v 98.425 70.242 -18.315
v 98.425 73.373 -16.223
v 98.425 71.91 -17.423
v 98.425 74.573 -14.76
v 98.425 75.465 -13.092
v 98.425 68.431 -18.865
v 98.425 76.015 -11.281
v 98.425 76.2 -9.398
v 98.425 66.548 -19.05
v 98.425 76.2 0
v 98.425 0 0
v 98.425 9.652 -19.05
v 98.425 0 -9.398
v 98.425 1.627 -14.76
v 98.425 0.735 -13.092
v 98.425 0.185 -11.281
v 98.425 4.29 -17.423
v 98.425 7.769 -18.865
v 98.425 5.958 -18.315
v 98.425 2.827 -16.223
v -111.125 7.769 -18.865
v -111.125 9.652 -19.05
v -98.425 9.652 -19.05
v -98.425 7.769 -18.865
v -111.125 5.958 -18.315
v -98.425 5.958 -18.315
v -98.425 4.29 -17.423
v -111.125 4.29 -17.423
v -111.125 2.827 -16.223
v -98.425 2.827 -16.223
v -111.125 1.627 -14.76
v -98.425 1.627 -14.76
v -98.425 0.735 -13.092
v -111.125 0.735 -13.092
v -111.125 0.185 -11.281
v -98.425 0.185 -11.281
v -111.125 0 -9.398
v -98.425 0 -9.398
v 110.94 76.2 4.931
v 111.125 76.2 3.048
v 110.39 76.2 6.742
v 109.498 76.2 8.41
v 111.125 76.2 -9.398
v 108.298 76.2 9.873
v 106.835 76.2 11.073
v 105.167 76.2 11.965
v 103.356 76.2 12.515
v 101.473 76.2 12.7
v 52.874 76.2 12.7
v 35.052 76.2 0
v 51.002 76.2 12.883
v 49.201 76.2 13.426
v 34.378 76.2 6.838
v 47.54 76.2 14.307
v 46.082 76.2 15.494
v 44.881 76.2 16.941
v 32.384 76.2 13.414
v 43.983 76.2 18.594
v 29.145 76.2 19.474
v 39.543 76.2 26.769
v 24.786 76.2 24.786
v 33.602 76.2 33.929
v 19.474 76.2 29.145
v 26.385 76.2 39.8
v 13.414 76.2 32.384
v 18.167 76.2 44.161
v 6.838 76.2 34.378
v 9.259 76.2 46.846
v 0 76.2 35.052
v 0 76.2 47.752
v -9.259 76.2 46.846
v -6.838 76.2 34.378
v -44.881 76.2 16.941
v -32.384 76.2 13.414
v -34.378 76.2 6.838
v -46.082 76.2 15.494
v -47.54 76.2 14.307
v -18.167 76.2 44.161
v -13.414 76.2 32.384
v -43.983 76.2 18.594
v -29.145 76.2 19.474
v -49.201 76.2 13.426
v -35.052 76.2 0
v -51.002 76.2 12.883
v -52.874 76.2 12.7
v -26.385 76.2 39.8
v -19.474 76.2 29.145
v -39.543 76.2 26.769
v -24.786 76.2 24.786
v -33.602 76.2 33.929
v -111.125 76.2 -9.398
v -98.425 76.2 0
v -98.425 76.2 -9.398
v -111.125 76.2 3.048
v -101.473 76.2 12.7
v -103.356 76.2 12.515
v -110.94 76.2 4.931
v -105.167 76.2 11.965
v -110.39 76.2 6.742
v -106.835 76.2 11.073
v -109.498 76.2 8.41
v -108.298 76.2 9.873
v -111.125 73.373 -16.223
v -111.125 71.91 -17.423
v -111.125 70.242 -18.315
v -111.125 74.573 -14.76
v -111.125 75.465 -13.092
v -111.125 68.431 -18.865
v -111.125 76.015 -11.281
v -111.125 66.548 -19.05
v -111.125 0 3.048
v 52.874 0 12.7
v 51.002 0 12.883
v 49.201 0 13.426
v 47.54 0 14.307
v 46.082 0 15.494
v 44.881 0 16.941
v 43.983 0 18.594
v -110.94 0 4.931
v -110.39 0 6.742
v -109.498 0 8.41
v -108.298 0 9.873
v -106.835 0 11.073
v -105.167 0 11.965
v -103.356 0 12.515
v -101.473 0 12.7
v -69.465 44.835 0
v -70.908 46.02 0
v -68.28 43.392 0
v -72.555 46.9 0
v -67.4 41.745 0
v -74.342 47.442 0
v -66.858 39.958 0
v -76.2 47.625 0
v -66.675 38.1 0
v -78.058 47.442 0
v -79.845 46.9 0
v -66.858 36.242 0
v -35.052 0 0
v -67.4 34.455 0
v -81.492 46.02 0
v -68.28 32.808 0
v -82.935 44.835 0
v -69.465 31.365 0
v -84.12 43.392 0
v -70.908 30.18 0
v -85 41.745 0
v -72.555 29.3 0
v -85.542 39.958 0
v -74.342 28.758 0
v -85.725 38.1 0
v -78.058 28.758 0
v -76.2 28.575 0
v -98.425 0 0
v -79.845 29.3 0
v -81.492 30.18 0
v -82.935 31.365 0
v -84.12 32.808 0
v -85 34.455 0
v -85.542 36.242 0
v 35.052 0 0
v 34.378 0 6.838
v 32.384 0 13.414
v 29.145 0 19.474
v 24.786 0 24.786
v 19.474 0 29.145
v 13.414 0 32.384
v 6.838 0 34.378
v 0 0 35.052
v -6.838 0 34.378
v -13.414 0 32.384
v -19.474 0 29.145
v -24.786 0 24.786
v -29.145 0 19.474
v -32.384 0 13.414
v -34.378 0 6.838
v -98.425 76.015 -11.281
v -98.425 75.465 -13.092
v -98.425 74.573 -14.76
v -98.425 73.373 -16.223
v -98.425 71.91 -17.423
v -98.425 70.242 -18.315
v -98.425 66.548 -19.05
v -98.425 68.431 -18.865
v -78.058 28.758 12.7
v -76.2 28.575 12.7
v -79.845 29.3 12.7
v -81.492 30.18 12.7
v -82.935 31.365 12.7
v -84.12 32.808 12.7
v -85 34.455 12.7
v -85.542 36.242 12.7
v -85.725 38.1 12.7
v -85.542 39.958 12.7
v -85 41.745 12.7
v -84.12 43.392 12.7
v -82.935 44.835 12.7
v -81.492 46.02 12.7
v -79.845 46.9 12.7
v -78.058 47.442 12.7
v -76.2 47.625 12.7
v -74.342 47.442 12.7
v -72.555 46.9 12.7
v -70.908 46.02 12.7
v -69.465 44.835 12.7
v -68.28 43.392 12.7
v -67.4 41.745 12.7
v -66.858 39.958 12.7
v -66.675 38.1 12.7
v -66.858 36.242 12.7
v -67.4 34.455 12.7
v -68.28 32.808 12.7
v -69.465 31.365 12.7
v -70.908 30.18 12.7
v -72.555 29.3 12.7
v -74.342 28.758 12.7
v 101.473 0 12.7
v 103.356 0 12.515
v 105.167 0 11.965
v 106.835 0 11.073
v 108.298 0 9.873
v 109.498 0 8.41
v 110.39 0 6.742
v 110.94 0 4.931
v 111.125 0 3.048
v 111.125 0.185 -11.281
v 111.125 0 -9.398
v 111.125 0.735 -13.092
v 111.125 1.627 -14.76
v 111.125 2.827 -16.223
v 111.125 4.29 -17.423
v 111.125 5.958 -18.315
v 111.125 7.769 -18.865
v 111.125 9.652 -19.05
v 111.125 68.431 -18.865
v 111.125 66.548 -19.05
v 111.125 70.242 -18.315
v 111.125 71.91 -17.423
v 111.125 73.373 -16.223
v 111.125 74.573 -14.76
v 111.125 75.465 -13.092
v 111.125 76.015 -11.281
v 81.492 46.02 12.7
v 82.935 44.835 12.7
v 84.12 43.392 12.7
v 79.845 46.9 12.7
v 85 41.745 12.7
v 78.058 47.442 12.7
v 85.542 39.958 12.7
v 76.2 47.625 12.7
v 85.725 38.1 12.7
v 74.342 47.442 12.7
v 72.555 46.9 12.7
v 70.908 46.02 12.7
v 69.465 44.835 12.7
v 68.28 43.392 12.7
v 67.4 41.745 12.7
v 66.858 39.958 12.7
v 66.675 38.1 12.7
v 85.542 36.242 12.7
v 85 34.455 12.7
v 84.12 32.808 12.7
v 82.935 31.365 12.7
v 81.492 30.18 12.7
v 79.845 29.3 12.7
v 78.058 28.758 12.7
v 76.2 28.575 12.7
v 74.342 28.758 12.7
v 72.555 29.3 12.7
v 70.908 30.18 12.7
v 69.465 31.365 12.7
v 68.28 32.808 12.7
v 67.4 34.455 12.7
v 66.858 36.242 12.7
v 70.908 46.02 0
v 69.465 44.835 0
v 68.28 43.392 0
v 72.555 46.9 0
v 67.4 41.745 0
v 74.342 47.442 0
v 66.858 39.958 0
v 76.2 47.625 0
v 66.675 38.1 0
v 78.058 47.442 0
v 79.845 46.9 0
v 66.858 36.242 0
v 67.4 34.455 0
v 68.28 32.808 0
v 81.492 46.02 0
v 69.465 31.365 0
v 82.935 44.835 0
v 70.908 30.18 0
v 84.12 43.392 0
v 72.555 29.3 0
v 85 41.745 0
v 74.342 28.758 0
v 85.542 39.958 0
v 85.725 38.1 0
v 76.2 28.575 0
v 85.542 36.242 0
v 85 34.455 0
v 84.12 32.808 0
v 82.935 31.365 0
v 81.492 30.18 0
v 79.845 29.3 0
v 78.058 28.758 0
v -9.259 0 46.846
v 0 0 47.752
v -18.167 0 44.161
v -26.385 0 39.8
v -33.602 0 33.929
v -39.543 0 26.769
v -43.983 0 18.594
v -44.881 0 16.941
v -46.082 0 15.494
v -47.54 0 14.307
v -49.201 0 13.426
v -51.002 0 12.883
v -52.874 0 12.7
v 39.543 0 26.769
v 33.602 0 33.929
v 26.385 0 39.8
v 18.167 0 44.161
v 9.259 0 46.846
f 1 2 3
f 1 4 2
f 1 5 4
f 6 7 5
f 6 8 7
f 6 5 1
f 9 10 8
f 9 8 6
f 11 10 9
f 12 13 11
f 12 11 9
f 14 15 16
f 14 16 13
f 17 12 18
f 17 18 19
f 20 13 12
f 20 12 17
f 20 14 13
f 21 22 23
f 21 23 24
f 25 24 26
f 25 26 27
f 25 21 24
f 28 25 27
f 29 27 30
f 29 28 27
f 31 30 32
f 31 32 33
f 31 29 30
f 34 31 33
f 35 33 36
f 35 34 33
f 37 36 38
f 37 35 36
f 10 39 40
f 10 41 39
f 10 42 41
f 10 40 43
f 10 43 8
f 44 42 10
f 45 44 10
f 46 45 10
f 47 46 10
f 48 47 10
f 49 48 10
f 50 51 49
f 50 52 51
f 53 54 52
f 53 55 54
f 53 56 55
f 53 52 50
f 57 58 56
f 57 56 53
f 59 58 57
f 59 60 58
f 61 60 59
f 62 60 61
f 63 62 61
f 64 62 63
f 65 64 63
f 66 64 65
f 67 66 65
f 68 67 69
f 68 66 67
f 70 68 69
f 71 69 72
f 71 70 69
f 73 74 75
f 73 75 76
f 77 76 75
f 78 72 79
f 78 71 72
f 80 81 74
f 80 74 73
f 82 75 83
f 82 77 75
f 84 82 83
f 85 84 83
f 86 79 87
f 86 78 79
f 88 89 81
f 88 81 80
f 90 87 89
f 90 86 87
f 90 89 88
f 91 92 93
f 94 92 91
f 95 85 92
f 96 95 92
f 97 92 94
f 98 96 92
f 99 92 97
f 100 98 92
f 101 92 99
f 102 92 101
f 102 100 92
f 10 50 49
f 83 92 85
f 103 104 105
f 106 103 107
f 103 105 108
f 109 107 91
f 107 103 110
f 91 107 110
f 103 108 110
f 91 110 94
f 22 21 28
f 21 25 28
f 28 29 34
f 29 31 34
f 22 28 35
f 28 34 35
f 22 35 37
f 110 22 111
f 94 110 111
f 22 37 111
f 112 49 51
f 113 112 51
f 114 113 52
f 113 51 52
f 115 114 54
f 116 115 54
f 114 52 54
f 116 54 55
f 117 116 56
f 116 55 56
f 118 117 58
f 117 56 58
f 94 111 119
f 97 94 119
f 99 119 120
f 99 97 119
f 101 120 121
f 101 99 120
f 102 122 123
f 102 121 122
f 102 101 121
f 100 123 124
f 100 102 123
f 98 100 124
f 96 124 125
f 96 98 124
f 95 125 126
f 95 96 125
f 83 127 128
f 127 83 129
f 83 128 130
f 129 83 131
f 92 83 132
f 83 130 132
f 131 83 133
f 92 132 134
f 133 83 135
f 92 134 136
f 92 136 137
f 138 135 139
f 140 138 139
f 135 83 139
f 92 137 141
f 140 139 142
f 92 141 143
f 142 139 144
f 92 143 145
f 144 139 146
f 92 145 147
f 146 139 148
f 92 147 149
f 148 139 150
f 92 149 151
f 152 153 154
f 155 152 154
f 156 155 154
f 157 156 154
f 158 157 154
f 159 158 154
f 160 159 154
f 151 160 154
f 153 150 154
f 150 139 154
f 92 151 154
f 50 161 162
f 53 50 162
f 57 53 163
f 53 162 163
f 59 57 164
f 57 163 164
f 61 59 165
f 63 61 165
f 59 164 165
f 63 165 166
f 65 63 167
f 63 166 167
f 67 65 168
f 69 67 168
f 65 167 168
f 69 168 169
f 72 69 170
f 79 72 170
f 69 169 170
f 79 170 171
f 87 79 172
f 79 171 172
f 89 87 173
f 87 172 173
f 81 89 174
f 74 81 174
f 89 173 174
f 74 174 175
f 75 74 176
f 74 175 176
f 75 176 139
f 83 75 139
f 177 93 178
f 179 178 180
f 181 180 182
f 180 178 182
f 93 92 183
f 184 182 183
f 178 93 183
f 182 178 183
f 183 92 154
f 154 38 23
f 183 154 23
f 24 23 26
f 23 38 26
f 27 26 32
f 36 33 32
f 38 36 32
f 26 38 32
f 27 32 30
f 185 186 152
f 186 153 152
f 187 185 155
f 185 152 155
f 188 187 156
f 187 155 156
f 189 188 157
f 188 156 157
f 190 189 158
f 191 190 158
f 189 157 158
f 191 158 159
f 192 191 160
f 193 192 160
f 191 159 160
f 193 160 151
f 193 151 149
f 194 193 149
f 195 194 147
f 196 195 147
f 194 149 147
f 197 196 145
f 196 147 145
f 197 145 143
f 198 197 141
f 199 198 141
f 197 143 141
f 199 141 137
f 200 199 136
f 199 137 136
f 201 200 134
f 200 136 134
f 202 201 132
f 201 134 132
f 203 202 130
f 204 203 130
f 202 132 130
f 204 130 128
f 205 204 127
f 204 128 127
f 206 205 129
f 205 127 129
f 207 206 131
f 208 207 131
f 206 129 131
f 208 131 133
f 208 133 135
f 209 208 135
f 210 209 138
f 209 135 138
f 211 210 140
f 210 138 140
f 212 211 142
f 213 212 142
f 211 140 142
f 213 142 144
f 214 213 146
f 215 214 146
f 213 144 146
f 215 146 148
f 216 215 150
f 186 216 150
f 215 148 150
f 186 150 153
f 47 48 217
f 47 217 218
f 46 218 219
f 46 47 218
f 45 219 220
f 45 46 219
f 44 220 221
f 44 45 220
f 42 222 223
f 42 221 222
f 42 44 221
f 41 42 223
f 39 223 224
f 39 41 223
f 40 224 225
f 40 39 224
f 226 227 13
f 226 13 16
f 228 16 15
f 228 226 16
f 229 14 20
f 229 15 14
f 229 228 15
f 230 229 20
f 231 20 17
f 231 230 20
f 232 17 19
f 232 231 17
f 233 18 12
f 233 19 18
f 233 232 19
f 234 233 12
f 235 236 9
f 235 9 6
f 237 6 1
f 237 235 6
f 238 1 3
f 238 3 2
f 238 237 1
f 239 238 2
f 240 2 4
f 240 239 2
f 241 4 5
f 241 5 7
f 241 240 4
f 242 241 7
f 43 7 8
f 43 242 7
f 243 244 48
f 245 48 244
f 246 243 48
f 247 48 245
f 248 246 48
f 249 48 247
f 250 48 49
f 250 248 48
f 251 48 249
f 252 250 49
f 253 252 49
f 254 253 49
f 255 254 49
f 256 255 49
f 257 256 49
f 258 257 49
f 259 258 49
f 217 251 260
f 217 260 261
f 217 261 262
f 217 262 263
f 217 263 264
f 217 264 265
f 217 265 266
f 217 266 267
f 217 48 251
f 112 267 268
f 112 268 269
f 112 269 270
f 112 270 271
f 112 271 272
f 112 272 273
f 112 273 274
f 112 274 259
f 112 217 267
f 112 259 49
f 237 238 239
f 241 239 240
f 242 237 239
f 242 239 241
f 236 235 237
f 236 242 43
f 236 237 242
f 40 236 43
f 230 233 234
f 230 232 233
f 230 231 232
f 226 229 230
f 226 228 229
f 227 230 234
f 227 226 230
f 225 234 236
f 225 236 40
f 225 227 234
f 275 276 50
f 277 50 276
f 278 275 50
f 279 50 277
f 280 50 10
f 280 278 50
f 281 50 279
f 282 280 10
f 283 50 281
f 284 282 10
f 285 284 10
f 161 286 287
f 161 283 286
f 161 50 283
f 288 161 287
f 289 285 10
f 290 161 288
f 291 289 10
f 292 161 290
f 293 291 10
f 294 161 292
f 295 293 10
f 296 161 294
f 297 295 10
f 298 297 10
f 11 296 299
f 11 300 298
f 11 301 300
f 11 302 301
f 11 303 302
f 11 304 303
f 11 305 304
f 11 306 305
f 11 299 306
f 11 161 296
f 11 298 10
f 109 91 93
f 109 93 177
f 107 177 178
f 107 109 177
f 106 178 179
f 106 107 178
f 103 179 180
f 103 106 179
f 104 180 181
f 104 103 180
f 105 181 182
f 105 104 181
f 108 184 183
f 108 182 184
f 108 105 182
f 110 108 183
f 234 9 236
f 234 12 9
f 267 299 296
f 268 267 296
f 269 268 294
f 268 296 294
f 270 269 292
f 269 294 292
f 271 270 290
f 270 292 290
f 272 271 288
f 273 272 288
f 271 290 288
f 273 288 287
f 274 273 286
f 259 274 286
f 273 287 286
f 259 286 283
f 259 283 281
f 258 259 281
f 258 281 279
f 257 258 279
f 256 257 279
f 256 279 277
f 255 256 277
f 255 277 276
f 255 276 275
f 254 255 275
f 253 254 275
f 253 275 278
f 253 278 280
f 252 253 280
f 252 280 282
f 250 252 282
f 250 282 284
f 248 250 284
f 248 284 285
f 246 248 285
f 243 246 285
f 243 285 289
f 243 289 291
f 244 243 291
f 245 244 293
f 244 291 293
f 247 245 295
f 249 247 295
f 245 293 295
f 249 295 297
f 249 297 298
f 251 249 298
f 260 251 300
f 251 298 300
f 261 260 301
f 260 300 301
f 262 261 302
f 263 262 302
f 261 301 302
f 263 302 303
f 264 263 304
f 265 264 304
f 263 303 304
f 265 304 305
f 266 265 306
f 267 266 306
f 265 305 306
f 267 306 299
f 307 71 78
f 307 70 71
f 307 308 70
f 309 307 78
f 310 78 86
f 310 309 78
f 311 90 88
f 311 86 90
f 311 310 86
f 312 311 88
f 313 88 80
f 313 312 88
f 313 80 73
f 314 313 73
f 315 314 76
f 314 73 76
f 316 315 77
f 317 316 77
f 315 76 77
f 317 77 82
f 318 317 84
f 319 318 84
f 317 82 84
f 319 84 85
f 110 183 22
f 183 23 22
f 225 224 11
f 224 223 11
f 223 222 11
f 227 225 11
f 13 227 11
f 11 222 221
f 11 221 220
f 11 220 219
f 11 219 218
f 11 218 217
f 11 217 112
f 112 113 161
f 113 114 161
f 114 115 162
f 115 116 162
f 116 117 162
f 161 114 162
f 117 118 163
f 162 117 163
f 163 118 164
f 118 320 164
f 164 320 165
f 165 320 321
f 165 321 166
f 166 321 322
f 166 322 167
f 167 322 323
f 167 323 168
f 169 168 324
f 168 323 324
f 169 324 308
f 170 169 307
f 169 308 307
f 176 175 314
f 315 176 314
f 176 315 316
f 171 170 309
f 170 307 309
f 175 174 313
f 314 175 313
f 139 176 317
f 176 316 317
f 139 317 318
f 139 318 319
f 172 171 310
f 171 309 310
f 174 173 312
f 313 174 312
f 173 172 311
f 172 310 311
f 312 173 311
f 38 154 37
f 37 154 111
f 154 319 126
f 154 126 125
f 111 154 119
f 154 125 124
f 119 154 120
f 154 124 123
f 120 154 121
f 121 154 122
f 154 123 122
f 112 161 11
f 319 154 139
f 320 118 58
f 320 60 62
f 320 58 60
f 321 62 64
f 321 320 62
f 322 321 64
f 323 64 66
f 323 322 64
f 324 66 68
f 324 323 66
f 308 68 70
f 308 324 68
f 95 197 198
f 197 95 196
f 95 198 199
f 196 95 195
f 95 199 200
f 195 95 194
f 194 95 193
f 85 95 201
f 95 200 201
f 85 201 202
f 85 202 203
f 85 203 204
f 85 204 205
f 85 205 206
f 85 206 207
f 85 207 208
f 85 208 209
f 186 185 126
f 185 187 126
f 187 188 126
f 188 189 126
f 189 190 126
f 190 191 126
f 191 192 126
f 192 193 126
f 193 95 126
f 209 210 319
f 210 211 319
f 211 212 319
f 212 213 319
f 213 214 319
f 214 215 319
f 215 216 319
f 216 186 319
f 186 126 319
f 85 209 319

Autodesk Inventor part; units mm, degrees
ref_plane "YZ Plane" through (0, 0, 0) normal (1, 0, 0) x (0, 1, 0)
ref_plane "XZ Plane" through (0, 0, 0) normal (0, 1, 0) x (-1, 0, 0)
ref_plane "XY Plane" through (0, 0, 0) normal (0, 0, 1) x (1, 0, 0)
sketch "Sketch1" plane through (0, 0, 0) normal (0, 1, 0) x (-1, 0, 0)
  line L0 (98.425, 0) -> (98.425, -19.05)
  line L1 (98.425, -19.05) -> (111.125, -19.05)
  line L2 (111.125, -19.05) -> (111.125, 12.7)
  line L3 (111.125, 12.7) -> (46.0322, 12.7)
  arc A0 (35.052, 0) -> (0, 35.052) centre (0, 0) ccw
  line L4 (0, 0) -> (35.052, 0) construction
  line L5 (0, 0) -> (35.052, 0) construction
  line L6 (0, 0) -> (0, 47.752) construction
  arc A1 (46.0322, 12.7) -> (0, 47.752) centre (0, 0) ccw
  line L7 (35.052, 0) -> (98.425, 0)
  line L8 (-98.425, 0) -> (-98.425, -19.05)
  line L9 (-98.425, -19.05) -> (-111.125, -19.05)
  line L10 (-111.125, -19.05) -> (-111.125, 12.7)
  line L11 (-111.125, 12.7) -> (-46.0322, 12.7)
  arc A2 (0, 35.052) -> (-35.052, 0) centre (0, 0) ccw
  arc A3 (0, 47.752) -> (-46.0322, 12.7) centre (0, 0) ccw
  line L12 (-35.052, 0) -> (-98.425, 0)
  arc A4 (35.052, 0) -> (-35.052, 0) centre (0, 0) ccw
  arc A5 (46.0322, 12.7) -> (-46.0322, 12.7) centre (0, 0) ccw
  line L13 (35.052, 0) -> (98.425, 0)
  line L14 (98.425, 0) -> (98.425, -19.05)
  line L15 (111.125, -19.05) -> (111.125, 12.7)
  line L16 (46.0322, 12.7) -> (111.125, 12.7)
  line L17 (-46.0322, 12.7) -> (-111.125, 12.7)
  line L18 (-111.125, -19.05) -> (-111.125, 12.7)
  line L19 (-98.425, -19.05) -> (-111.125, -19.05)
  line L20 (-98.425, 0) -> (-35.052, 0)
  line L21 (-98.425, 0) -> (-35.052, 0)
  dimension "d7" = 12.7
  dimension "d9" = 35.052
  dimension "d10" = 0
  dimension "d11" = 90
  dimension "d12" = 12.7
  dimension "d13" = 31.75
  dimension "d14" = 12.7
  dimension "d30" = 98.425
extrude "Extrusion1" add sketch "Sketch1" along normal blind 76.2
fillet "Fillet1" radius 9.652 8 edges at (111.125, 38.1, 12.7) (46.0322, 38.1, 12.7) (104.775, 76.2, -19.05) (104.775, 0, -19.05) (-46.0322, 38.1, 12.7) (-111.125, 38.1, 12.7) (-104.775, 0, -19.05) (-104.775, 76.2, -19.05)
sketch "Sketch2" plane through (52.8735, 0, 12.7) normal (0, 0, 1) x (1, 0, 0)
  line L0 (-52.8735, 0) -> (-52.8735, 38.1) construction
  line L1 (-52.8735, 38.1) -> (-129.0735, 38.1) construction
  line L2 (-52.8735, 38.1) -> (23.3265, 38.1) construction
  dimension "d20" = 38.1
  dimension "d21" = 76.2
  dimension "d22" = 76.2
hole "Hole1" at (-76.2, 38.1, 12.7) at (76.2, 38.1, 12.7) direction (0, 0, -1) diameter 19.05 end through all
properties part number "SólidoA"
